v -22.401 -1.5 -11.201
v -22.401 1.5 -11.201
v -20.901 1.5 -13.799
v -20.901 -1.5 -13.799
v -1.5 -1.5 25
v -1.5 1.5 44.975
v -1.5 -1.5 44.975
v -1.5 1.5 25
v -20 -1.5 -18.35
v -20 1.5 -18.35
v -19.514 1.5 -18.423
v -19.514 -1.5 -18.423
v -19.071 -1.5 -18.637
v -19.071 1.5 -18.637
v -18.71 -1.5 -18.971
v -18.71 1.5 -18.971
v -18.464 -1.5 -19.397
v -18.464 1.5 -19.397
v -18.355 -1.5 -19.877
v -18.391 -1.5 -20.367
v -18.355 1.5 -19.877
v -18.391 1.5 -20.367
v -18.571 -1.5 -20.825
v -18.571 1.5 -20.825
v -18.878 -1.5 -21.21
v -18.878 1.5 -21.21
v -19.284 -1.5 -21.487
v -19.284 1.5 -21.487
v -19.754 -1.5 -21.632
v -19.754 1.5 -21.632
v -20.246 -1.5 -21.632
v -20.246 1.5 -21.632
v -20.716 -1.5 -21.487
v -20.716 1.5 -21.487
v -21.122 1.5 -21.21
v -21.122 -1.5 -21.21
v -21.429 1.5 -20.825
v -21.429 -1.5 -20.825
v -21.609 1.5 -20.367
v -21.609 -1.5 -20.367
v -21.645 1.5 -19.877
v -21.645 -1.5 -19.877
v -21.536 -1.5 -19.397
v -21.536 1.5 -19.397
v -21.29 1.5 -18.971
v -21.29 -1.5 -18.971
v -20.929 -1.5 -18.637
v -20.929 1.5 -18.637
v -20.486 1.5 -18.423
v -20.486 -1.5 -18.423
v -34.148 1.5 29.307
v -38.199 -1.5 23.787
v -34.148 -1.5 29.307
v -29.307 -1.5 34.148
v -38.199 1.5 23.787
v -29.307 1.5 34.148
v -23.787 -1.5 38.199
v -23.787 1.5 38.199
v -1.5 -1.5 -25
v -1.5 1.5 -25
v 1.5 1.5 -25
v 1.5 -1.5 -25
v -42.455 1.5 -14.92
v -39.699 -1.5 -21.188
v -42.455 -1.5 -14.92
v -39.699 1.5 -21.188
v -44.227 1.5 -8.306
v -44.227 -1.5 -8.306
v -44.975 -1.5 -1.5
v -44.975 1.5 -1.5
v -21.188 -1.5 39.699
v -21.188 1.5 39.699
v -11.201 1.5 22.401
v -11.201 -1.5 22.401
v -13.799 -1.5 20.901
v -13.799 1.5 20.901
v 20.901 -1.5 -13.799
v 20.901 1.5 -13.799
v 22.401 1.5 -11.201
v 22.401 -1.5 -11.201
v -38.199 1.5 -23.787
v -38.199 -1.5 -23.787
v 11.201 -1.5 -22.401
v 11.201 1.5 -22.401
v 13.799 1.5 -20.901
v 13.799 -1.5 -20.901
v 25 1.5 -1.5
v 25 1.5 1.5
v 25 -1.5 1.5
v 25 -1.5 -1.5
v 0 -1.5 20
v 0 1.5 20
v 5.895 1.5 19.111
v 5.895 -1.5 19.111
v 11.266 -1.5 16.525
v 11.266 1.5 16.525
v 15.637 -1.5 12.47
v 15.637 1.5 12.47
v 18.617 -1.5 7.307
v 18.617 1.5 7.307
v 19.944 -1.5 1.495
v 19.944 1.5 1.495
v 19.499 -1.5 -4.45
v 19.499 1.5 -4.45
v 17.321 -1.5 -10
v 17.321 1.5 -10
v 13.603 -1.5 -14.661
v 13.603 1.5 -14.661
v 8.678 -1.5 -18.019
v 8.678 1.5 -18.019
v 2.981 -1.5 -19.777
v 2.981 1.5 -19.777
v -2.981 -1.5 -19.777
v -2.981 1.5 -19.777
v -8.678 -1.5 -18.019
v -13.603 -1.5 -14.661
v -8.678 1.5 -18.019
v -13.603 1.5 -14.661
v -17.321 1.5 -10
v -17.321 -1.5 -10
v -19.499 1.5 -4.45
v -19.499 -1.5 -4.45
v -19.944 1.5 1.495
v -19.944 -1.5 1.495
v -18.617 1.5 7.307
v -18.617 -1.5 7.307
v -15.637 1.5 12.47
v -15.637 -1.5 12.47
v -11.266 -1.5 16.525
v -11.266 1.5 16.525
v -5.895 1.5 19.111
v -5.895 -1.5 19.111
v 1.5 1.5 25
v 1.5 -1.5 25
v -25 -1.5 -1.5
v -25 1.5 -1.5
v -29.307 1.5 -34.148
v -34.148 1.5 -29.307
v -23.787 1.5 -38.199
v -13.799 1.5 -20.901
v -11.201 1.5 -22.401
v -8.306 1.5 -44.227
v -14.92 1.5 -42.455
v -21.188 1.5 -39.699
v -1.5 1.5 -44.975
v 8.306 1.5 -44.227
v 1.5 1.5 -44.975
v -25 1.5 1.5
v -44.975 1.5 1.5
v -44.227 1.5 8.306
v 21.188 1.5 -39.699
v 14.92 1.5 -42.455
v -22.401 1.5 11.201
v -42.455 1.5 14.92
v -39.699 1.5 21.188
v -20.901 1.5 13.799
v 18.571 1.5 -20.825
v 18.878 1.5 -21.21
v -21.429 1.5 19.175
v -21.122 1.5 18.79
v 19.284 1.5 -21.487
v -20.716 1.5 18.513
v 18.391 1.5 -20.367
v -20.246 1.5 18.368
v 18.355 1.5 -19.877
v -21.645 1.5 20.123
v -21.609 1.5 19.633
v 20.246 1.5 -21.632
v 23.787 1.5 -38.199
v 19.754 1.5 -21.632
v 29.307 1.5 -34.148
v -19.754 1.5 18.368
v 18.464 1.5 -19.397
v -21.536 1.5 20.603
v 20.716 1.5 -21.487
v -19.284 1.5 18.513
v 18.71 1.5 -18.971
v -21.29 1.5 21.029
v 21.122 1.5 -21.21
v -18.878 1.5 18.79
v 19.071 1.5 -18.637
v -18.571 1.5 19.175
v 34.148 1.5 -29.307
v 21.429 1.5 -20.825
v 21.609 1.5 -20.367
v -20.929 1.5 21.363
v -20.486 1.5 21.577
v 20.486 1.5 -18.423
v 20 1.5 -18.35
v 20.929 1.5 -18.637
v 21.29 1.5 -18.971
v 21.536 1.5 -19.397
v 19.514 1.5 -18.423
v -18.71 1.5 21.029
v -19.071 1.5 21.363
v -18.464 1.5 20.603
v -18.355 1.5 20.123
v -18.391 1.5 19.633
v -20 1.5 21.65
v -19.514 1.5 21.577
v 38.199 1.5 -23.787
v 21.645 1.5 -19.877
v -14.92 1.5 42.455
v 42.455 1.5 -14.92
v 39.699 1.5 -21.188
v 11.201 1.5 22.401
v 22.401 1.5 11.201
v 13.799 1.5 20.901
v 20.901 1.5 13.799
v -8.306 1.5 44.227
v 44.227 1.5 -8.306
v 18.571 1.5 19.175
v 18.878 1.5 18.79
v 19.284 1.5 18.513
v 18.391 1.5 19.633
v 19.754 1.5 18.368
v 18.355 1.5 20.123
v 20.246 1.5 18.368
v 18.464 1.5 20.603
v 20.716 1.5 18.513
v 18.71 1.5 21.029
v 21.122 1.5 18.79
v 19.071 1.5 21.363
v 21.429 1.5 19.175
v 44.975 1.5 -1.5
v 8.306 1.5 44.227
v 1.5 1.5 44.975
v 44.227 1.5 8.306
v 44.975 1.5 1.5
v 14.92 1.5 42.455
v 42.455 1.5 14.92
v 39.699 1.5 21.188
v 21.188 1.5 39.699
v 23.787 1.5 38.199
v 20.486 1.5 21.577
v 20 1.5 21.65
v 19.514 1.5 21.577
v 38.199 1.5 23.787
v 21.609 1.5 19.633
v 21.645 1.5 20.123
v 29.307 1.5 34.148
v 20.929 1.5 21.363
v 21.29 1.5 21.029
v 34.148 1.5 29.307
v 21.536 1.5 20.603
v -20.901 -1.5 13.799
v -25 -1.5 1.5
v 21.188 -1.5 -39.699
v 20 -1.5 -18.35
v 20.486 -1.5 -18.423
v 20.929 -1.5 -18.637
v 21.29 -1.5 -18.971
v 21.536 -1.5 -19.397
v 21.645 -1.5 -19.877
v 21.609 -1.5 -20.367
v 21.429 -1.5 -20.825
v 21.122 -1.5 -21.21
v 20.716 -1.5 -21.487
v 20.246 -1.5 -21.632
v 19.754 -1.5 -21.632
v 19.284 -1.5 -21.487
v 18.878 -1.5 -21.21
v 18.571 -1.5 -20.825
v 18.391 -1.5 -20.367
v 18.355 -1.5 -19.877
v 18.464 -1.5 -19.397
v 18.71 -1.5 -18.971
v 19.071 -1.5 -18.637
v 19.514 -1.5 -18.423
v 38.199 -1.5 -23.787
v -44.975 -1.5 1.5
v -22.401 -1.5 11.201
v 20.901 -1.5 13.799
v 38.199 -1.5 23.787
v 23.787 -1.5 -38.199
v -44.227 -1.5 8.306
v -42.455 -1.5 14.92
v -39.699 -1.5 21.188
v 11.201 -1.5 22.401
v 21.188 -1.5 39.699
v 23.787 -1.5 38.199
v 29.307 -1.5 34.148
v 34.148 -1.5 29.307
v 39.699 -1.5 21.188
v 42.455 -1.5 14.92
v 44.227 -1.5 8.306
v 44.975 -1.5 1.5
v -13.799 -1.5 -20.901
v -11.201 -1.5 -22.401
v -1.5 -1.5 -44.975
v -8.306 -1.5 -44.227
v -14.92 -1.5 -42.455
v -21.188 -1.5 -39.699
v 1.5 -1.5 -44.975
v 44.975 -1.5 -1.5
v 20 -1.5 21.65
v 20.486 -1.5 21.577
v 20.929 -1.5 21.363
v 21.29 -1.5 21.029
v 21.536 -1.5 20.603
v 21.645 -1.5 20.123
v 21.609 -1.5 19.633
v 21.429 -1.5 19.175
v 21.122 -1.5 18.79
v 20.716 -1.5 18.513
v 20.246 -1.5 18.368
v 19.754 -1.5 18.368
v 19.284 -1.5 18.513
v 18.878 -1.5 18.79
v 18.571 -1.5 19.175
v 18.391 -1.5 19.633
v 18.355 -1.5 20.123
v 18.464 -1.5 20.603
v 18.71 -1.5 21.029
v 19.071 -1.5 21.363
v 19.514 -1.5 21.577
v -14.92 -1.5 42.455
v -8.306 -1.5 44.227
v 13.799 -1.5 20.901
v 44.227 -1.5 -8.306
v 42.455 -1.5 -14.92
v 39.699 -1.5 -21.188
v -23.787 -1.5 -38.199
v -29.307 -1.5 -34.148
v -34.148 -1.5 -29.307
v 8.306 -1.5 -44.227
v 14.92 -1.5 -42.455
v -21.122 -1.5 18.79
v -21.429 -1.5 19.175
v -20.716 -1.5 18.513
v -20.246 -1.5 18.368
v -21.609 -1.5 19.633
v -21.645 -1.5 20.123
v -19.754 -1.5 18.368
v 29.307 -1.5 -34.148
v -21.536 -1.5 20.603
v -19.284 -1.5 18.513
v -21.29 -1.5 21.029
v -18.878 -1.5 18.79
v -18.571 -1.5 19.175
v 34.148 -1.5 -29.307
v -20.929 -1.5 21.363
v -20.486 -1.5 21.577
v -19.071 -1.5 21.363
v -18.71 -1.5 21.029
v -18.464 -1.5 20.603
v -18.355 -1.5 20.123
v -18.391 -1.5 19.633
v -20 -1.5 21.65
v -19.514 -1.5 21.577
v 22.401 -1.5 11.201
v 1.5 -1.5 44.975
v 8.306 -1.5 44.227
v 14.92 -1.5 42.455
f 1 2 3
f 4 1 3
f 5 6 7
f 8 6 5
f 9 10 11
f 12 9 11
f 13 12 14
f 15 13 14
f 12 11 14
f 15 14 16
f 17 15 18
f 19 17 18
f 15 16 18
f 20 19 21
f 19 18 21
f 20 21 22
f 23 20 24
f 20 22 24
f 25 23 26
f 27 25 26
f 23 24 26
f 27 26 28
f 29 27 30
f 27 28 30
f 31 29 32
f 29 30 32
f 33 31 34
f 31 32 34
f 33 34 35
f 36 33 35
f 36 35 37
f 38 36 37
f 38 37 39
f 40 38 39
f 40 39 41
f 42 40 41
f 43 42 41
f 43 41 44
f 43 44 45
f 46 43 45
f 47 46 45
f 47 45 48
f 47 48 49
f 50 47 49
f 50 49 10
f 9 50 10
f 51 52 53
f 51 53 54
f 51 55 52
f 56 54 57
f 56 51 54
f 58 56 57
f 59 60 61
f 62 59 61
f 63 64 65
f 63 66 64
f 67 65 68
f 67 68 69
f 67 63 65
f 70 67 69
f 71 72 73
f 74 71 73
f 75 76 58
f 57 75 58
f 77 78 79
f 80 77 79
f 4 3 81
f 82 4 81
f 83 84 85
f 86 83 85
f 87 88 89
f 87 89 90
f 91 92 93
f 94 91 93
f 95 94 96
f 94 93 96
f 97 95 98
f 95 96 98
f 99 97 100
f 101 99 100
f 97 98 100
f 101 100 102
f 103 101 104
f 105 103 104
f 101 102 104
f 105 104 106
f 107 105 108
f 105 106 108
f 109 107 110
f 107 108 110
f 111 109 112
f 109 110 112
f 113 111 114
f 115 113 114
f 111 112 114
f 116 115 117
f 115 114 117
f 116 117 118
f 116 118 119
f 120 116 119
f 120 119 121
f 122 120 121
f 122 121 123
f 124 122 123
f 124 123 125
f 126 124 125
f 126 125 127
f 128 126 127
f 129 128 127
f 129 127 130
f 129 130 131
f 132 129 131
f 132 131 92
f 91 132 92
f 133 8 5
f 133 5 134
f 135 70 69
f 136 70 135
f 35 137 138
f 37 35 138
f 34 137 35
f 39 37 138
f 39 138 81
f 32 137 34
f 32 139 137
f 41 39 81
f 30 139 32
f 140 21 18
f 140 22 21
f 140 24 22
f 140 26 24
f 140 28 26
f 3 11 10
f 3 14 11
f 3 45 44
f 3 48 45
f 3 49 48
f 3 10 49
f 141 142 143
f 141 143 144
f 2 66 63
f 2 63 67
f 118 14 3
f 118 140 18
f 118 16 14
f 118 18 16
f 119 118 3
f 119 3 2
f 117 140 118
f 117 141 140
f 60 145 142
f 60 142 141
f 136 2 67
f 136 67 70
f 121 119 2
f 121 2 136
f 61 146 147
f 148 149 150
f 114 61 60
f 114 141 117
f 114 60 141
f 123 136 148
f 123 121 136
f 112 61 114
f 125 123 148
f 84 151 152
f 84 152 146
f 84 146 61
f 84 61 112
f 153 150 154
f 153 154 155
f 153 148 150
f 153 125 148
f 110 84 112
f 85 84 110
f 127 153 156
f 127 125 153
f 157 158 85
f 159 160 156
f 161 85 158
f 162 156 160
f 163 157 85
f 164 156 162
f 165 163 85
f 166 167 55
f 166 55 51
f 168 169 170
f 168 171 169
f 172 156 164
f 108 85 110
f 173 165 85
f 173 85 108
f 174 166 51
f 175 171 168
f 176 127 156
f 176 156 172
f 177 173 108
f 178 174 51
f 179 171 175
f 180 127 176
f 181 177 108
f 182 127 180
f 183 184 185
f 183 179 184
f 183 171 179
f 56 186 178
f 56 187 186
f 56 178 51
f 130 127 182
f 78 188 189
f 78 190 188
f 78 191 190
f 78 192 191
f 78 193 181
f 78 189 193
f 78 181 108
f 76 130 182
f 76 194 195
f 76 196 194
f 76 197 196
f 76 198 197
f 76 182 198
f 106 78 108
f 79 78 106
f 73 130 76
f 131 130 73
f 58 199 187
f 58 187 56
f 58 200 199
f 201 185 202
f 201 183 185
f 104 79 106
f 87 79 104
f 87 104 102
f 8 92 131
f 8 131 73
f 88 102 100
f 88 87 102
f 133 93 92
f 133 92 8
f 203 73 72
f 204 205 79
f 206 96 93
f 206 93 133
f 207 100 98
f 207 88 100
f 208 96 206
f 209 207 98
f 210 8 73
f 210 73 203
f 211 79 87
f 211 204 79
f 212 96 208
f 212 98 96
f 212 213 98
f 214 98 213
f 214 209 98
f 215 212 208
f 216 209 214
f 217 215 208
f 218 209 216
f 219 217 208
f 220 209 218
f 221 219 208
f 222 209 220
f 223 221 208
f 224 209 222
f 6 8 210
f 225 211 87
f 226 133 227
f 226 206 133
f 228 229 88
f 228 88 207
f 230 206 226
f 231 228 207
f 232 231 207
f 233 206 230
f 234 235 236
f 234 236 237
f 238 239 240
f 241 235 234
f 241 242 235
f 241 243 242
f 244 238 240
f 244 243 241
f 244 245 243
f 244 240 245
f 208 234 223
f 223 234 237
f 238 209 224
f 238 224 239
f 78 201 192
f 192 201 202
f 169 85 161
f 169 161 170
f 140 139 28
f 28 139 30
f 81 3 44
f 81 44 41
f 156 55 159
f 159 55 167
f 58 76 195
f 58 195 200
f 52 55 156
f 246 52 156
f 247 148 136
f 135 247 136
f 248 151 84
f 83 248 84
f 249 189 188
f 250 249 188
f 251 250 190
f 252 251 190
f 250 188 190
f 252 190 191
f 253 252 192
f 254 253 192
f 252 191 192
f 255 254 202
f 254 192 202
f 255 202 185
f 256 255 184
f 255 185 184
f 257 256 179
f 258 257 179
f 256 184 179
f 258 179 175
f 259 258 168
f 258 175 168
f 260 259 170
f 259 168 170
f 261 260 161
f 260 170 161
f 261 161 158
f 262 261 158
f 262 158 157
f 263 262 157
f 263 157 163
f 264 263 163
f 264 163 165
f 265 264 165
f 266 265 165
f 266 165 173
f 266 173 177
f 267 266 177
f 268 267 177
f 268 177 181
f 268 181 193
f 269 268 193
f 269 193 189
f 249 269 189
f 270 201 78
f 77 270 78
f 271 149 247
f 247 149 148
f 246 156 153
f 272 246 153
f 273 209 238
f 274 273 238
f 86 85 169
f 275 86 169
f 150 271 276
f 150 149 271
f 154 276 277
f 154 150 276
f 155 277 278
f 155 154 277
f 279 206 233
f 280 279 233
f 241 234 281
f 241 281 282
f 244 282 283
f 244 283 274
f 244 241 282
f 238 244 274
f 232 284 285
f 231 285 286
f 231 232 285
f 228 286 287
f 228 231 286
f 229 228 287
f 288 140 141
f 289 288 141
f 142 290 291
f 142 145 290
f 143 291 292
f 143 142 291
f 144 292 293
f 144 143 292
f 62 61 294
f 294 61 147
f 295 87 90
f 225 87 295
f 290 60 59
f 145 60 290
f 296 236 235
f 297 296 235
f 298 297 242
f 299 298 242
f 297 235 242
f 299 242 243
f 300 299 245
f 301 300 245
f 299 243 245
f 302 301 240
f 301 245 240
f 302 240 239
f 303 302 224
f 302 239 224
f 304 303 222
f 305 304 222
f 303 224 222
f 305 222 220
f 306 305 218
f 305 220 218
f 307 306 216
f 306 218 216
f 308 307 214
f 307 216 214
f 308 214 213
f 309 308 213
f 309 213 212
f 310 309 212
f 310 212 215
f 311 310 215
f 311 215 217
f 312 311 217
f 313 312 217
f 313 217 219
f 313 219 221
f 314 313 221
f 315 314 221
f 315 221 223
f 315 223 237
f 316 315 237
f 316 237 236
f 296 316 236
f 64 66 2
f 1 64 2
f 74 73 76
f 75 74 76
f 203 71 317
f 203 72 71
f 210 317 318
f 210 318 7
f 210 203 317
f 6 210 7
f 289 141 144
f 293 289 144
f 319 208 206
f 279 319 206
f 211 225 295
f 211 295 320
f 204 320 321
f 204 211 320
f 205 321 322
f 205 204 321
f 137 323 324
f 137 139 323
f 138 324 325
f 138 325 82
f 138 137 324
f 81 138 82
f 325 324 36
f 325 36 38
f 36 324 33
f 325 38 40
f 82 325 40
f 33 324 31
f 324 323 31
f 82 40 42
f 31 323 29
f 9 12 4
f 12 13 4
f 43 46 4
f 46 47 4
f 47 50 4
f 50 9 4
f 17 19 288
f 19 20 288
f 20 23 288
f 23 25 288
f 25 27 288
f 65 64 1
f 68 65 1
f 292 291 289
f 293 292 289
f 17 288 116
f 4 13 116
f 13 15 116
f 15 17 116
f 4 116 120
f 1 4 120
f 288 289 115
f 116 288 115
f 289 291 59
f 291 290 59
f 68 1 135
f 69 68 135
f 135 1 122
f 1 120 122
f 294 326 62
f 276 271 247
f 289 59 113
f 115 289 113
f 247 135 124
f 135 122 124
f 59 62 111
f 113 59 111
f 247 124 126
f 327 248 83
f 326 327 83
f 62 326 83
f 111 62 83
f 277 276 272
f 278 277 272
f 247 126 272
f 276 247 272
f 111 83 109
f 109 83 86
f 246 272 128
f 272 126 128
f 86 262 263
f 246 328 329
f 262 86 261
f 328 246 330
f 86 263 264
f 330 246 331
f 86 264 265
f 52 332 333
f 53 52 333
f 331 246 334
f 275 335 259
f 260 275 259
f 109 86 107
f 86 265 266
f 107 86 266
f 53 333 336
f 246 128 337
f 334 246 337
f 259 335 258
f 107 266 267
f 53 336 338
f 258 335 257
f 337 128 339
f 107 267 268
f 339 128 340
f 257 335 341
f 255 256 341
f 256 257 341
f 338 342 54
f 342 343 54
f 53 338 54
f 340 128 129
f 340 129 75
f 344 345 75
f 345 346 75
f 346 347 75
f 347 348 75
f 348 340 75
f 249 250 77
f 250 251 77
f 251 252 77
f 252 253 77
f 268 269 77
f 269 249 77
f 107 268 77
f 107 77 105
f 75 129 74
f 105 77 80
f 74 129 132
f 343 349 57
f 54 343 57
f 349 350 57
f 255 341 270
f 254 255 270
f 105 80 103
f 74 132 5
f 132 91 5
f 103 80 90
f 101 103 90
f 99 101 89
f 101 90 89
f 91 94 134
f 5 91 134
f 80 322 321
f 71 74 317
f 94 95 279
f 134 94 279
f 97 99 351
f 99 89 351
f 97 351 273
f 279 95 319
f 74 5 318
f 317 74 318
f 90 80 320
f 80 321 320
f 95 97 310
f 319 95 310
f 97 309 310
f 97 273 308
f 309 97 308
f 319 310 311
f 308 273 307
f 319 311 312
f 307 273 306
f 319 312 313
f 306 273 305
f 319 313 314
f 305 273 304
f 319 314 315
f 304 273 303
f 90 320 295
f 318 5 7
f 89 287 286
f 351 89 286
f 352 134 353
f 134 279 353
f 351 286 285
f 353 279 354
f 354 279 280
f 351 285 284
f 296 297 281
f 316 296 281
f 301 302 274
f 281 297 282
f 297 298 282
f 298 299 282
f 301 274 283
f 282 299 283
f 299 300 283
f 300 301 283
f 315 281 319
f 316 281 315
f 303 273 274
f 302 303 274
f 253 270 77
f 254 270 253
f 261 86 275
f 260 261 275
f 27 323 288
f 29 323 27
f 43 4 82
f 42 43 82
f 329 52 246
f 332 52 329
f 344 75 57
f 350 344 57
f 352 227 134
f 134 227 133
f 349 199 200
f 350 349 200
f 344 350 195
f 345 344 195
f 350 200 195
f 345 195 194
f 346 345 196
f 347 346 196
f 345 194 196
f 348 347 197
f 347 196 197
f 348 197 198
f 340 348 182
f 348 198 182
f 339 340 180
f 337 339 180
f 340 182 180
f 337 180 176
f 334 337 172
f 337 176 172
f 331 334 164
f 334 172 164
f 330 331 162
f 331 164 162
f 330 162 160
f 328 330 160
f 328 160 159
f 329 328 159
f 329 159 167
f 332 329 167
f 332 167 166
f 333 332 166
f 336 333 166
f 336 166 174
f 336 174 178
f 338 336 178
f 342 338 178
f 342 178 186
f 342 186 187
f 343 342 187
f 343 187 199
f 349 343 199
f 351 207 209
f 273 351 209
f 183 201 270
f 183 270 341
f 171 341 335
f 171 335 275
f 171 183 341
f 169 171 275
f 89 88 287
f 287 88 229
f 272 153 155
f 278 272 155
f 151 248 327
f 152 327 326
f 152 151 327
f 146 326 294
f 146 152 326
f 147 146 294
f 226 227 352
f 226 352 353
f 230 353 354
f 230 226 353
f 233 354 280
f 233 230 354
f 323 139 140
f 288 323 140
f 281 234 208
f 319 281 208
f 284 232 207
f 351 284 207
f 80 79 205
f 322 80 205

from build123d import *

# Parameters (mm, degrees)
SKETCH1_R           = 45
SKETCH1_R_2         = 10
BOSS_EXTRUDE1_DEPTH = 1.5
SKETCH2_R           = 1.65
CUT_EXTRUDE1_DEPTH  = 10
SKETCH3_W           = 3
SKETCH3_H           = 20
SKETCH3_W_2         = 20
SKETCH3_H_2         = 3
CUT_EXTRUDE2_DEPTH  = 10
SKETCH4_R           = 20
CUT_EXTRUDE3_DEPTH  = 10


with BuildPart() as part:
    # Sketch1 → Boss-Extrude1 (new, symmetric)
    with BuildSketch(Plane(origin=(0, 0, 0), x_dir=(1, 0, 0), z_dir=(0, 1, 0))):
        with Locations(Location((0, 0, 0), (0, 0, 270))):
            Circle(SKETCH1_R)
        with Locations(Location((0, 0, 0), (0, 0, 270))):
            Circle(SKETCH1_R_2, mode=Mode.SUBTRACT)
    extrude(amount=BOSS_EXTRUDE1_DEPTH, both=True)

    # Sketch2 → Cut-Extrude1 (cut)
    with BuildSketch(Plane(origin=(0, 1.5, 0), x_dir=(1, 0, 0), z_dir=(0, 1, 0))):
        with Locations(Location((-20, -20, 0), (0, 0, 270))):
            Circle(SKETCH2_R)
        with Locations(Location((-20, 20, 0), (0, 0, 270))):
            Circle(SKETCH2_R)
        with Locations(Location((20, 20, 0), (0, 0, 270))):
            Circle(SKETCH2_R)
        with Locations(Location((20, -20, 0), (0, 0, 270))):
            Circle(SKETCH2_R)
    extrude(amount=-CUT_EXTRUDE1_DEPTH, mode=Mode.SUBTRACT)

    # Sketch3 → Cut-Extrude2 (cut)
    with BuildSketch(Plane(origin=(0, 1.5, 0), x_dir=(1, 0, 0), z_dir=(0, 1, 0))):
        with Locations((0, -35)):
            Rectangle(SKETCH3_W, SKETCH3_H)
        Polygon((-13.799038106, -20.900635095), (-23.799038106, -38.22114317), (-21.200961894, -39.72114317), (-11.200961894, -22.400635095), align=None)
        Polygon((-22.400635095, -11.200961894), (-39.72114317, -21.200961894), (-38.22114317, -23.799038106), (-20.900635095, -13.799038106), align=None)
        with Locations((-35, 0)):
            Rectangle(SKETCH3_W_2, SKETCH3_H_2)
        Polygon((-20.900635095, 13.799038106), (-38.22114317, 23.799038106), (-39.72114317, 21.200961894), (-22.400635095, 11.200961894), align=None)
        Polygon((-11.200961894, 22.400635095), (-21.200961894, 39.72114317), (-23.799038106, 38.22114317), (-13.799038106, 20.900635095), align=None)
        with Locations((0, 35)):
            Rectangle(SKETCH3_W, SKETCH3_H)
        Polygon((13.799038106, 20.900635095), (23.799038106, 38.22114317), (21.200961894, 39.72114317), (11.200961894, 22.400635095), align=None)
        Polygon((22.400635095, 11.200961894), (39.72114317, 21.200961894), (38.22114317, 23.799038106), (20.900635095, 13.799038106), align=None)
        with Locations((35, 0)):
            Rectangle(SKETCH3_W_2, SKETCH3_H_2)
        Polygon((20.900635095, -13.799038106), (38.22114317, -23.799038106), (39.72114317, -21.200961894), (22.400635095, -11.200961894), align=None)
        Polygon((11.200961894, -22.400635095), (21.200961894, -39.72114317), (23.799038106, -38.22114317), (13.799038106, -20.900635095), align=None)
    extrude(amount=-CUT_EXTRUDE2_DEPTH, mode=Mode.SUBTRACT)

    # Sketch4 → Cut-Extrude3 (cut)
    with BuildSketch(Plane(origin=(0, 1.5, 0), x_dir=(1, 0, 0), z_dir=(0, 1, 0))):
        with Locations(Location((0, 0, 0), (0, 0, 270))):
            Circle(SKETCH4_R)
    extrude(amount=-CUT_EXTRUDE3_DEPTH, mode=Mode.SUBTRACT)


solid = part.part
